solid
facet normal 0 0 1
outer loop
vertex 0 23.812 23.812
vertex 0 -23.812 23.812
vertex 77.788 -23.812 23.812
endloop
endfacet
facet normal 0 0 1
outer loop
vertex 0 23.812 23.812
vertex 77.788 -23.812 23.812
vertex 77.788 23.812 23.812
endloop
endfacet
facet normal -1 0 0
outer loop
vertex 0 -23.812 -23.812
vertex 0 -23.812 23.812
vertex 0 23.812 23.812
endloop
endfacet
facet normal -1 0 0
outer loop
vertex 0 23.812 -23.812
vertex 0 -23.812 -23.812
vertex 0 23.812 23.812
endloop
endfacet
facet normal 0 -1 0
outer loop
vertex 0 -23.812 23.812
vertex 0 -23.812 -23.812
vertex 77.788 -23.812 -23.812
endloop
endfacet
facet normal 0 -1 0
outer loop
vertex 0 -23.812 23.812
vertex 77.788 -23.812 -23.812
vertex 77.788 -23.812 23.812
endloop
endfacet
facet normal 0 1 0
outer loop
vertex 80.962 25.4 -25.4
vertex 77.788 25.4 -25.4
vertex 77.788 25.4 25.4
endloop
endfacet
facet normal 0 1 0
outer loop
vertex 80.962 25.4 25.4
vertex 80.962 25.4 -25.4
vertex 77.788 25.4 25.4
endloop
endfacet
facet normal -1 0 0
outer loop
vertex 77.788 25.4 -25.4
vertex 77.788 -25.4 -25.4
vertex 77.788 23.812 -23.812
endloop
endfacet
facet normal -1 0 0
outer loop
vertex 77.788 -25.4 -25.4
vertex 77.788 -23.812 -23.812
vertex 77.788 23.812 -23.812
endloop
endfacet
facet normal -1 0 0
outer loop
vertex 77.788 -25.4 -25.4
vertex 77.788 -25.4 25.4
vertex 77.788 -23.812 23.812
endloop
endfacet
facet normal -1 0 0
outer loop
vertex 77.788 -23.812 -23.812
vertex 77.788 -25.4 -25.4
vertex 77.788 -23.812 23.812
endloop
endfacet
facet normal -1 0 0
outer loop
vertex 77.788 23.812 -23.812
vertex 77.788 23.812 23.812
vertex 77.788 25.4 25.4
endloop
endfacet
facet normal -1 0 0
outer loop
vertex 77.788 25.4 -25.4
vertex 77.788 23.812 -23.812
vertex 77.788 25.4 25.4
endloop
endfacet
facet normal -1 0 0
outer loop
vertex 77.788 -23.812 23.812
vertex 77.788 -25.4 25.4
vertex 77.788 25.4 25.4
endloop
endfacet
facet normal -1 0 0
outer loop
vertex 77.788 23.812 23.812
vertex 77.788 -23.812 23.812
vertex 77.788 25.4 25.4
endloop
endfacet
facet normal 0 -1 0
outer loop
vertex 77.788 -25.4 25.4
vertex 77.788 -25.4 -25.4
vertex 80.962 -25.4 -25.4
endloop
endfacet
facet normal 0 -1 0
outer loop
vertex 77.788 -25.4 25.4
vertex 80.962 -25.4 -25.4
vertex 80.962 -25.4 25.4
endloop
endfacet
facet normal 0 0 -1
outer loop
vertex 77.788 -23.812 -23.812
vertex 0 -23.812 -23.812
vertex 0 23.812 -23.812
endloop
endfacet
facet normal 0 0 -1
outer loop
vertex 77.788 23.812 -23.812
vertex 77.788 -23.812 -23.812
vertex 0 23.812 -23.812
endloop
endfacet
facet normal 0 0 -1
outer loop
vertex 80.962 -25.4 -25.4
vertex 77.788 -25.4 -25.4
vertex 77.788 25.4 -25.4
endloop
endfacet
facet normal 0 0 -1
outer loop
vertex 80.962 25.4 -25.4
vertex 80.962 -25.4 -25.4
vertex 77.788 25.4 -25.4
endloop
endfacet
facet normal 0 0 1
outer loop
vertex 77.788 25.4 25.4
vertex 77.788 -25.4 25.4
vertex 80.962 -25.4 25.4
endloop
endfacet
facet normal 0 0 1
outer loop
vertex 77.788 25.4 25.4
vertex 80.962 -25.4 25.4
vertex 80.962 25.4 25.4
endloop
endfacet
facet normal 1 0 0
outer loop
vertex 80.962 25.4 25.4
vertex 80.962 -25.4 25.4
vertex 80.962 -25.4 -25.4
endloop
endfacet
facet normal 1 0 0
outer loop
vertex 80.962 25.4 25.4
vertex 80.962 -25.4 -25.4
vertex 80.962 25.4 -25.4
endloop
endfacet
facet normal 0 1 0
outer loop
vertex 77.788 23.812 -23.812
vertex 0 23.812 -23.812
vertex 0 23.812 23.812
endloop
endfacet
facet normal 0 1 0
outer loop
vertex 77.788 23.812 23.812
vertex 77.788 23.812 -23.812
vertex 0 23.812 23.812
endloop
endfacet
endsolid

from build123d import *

# Parameters (mm, degrees)
F0_W     = 47.625
F0_H     = 47.625
F1_DEPTH = 77.7875
F2_W     = 50.8
F2_H     = 50.8
F3_DEPTH = 3.175


with BuildPart() as f1:
    # F0 (on Right) → F1 (new body)
    with BuildSketch(Plane.YZ):
        Rectangle(F0_W, F0_H)
    extrude(amount=F1_DEPTH)

    # F2 (on face) → F3 (join)
    with BuildSketch(Plane.YZ.offset(77.7875)):
        Rectangle(F2_W, F2_H)
    extrude(amount=F3_DEPTH)


solid = f1.part
